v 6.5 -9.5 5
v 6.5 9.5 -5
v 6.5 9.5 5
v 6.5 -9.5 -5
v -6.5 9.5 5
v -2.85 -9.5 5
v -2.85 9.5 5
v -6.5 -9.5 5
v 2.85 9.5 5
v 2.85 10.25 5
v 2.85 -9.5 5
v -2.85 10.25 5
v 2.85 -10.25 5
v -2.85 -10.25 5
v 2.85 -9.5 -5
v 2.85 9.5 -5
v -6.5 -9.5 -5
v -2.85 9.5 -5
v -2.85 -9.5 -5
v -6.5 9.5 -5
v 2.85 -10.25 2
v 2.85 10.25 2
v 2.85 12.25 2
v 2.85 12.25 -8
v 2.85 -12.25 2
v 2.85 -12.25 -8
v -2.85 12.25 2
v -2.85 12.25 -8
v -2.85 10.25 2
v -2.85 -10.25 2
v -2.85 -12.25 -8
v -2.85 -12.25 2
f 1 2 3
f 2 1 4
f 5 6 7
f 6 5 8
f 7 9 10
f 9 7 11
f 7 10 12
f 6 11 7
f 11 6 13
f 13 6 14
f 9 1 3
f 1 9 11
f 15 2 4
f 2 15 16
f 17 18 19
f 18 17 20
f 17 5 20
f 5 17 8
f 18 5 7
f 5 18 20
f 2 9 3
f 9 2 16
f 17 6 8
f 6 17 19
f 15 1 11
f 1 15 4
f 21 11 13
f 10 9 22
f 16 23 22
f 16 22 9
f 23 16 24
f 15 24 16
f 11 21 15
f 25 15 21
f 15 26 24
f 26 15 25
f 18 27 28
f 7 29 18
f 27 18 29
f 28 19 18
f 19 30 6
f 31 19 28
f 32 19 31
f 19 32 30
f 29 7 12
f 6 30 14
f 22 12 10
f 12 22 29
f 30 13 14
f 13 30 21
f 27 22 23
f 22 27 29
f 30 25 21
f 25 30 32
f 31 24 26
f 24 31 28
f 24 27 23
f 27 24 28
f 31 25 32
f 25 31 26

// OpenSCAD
switchCutoutRockerOnOff();

module switchCutoutRockerOnOff(
	scroo_powerSwitchWidth = 13,
	scroo_powerSwitchHeigth = 19,
	scroo_powerSwitchClipWidth = 5.7,
	scroo_powerSwitchClipHeigth = 20.5

  ){ 
		cube([scroo_powerSwitchWidth,scroo_powerSwitchHeigth,10],center=true);
		cube([scroo_powerSwitchClipWidth,scroo_powerSwitchClipHeigth,10],center=true);
		translate([0,0,-3]) cube([scroo_powerSwitchClipWidth,scroo_powerSwitchClipHeigth+4,10],center=true);
}
